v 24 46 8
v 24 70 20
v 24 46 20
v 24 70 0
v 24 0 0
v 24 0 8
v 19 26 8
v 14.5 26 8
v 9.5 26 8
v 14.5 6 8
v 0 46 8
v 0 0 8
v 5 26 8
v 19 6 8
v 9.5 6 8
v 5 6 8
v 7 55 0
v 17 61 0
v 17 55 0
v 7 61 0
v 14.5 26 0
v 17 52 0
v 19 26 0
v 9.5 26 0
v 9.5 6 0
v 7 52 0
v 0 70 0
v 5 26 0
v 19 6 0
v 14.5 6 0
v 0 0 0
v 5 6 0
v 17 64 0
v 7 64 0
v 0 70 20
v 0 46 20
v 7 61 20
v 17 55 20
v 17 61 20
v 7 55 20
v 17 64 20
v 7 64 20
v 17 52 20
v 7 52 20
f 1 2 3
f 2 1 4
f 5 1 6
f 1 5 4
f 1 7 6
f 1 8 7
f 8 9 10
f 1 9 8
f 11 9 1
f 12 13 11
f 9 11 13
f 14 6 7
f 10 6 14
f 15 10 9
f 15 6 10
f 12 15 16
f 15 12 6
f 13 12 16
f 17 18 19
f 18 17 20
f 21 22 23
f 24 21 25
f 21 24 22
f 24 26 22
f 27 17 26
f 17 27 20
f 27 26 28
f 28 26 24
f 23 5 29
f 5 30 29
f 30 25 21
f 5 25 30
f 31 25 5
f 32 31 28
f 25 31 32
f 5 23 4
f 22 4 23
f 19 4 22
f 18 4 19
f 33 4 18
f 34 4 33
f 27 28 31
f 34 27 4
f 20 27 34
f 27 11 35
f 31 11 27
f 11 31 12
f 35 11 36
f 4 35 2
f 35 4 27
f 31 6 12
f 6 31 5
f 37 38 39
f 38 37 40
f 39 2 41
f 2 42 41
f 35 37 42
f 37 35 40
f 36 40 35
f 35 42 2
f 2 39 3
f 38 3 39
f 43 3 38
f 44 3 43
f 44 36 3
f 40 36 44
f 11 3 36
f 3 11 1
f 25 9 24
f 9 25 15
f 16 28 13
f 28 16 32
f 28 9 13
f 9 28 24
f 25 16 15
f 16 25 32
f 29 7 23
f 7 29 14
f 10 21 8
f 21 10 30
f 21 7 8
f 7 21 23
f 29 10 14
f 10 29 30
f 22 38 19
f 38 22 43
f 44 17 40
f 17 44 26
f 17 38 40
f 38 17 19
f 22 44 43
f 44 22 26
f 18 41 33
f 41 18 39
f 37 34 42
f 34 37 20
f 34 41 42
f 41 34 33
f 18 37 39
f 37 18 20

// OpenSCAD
// Original MechIntel educational model. CC0-1.0. Units: mm.
// Not a standardized or load-rated component.
$fn=96;
width=24;
length=70;
body=8;
contact_length=24;
contact_height=12;
slot_width=4.5;
$fn=64;
difference(){union(){
translate([0,0,0]) cube([width,length,body]);
translate([0,length-contact_length,body]) cube([width,contact_length,contact_height]);
}
translate([5,6,-1]) cube([slot_width,20,body+2]);
translate([width-5-slot_width,6,-1]) cube([slot_width,20,body+2]);
translate([7,length-contact_length+6,-1]) cube([10,3,body+contact_height+2]);
translate([7,length-9,-1]) cube([10,3,body+contact_height+2]);
}
